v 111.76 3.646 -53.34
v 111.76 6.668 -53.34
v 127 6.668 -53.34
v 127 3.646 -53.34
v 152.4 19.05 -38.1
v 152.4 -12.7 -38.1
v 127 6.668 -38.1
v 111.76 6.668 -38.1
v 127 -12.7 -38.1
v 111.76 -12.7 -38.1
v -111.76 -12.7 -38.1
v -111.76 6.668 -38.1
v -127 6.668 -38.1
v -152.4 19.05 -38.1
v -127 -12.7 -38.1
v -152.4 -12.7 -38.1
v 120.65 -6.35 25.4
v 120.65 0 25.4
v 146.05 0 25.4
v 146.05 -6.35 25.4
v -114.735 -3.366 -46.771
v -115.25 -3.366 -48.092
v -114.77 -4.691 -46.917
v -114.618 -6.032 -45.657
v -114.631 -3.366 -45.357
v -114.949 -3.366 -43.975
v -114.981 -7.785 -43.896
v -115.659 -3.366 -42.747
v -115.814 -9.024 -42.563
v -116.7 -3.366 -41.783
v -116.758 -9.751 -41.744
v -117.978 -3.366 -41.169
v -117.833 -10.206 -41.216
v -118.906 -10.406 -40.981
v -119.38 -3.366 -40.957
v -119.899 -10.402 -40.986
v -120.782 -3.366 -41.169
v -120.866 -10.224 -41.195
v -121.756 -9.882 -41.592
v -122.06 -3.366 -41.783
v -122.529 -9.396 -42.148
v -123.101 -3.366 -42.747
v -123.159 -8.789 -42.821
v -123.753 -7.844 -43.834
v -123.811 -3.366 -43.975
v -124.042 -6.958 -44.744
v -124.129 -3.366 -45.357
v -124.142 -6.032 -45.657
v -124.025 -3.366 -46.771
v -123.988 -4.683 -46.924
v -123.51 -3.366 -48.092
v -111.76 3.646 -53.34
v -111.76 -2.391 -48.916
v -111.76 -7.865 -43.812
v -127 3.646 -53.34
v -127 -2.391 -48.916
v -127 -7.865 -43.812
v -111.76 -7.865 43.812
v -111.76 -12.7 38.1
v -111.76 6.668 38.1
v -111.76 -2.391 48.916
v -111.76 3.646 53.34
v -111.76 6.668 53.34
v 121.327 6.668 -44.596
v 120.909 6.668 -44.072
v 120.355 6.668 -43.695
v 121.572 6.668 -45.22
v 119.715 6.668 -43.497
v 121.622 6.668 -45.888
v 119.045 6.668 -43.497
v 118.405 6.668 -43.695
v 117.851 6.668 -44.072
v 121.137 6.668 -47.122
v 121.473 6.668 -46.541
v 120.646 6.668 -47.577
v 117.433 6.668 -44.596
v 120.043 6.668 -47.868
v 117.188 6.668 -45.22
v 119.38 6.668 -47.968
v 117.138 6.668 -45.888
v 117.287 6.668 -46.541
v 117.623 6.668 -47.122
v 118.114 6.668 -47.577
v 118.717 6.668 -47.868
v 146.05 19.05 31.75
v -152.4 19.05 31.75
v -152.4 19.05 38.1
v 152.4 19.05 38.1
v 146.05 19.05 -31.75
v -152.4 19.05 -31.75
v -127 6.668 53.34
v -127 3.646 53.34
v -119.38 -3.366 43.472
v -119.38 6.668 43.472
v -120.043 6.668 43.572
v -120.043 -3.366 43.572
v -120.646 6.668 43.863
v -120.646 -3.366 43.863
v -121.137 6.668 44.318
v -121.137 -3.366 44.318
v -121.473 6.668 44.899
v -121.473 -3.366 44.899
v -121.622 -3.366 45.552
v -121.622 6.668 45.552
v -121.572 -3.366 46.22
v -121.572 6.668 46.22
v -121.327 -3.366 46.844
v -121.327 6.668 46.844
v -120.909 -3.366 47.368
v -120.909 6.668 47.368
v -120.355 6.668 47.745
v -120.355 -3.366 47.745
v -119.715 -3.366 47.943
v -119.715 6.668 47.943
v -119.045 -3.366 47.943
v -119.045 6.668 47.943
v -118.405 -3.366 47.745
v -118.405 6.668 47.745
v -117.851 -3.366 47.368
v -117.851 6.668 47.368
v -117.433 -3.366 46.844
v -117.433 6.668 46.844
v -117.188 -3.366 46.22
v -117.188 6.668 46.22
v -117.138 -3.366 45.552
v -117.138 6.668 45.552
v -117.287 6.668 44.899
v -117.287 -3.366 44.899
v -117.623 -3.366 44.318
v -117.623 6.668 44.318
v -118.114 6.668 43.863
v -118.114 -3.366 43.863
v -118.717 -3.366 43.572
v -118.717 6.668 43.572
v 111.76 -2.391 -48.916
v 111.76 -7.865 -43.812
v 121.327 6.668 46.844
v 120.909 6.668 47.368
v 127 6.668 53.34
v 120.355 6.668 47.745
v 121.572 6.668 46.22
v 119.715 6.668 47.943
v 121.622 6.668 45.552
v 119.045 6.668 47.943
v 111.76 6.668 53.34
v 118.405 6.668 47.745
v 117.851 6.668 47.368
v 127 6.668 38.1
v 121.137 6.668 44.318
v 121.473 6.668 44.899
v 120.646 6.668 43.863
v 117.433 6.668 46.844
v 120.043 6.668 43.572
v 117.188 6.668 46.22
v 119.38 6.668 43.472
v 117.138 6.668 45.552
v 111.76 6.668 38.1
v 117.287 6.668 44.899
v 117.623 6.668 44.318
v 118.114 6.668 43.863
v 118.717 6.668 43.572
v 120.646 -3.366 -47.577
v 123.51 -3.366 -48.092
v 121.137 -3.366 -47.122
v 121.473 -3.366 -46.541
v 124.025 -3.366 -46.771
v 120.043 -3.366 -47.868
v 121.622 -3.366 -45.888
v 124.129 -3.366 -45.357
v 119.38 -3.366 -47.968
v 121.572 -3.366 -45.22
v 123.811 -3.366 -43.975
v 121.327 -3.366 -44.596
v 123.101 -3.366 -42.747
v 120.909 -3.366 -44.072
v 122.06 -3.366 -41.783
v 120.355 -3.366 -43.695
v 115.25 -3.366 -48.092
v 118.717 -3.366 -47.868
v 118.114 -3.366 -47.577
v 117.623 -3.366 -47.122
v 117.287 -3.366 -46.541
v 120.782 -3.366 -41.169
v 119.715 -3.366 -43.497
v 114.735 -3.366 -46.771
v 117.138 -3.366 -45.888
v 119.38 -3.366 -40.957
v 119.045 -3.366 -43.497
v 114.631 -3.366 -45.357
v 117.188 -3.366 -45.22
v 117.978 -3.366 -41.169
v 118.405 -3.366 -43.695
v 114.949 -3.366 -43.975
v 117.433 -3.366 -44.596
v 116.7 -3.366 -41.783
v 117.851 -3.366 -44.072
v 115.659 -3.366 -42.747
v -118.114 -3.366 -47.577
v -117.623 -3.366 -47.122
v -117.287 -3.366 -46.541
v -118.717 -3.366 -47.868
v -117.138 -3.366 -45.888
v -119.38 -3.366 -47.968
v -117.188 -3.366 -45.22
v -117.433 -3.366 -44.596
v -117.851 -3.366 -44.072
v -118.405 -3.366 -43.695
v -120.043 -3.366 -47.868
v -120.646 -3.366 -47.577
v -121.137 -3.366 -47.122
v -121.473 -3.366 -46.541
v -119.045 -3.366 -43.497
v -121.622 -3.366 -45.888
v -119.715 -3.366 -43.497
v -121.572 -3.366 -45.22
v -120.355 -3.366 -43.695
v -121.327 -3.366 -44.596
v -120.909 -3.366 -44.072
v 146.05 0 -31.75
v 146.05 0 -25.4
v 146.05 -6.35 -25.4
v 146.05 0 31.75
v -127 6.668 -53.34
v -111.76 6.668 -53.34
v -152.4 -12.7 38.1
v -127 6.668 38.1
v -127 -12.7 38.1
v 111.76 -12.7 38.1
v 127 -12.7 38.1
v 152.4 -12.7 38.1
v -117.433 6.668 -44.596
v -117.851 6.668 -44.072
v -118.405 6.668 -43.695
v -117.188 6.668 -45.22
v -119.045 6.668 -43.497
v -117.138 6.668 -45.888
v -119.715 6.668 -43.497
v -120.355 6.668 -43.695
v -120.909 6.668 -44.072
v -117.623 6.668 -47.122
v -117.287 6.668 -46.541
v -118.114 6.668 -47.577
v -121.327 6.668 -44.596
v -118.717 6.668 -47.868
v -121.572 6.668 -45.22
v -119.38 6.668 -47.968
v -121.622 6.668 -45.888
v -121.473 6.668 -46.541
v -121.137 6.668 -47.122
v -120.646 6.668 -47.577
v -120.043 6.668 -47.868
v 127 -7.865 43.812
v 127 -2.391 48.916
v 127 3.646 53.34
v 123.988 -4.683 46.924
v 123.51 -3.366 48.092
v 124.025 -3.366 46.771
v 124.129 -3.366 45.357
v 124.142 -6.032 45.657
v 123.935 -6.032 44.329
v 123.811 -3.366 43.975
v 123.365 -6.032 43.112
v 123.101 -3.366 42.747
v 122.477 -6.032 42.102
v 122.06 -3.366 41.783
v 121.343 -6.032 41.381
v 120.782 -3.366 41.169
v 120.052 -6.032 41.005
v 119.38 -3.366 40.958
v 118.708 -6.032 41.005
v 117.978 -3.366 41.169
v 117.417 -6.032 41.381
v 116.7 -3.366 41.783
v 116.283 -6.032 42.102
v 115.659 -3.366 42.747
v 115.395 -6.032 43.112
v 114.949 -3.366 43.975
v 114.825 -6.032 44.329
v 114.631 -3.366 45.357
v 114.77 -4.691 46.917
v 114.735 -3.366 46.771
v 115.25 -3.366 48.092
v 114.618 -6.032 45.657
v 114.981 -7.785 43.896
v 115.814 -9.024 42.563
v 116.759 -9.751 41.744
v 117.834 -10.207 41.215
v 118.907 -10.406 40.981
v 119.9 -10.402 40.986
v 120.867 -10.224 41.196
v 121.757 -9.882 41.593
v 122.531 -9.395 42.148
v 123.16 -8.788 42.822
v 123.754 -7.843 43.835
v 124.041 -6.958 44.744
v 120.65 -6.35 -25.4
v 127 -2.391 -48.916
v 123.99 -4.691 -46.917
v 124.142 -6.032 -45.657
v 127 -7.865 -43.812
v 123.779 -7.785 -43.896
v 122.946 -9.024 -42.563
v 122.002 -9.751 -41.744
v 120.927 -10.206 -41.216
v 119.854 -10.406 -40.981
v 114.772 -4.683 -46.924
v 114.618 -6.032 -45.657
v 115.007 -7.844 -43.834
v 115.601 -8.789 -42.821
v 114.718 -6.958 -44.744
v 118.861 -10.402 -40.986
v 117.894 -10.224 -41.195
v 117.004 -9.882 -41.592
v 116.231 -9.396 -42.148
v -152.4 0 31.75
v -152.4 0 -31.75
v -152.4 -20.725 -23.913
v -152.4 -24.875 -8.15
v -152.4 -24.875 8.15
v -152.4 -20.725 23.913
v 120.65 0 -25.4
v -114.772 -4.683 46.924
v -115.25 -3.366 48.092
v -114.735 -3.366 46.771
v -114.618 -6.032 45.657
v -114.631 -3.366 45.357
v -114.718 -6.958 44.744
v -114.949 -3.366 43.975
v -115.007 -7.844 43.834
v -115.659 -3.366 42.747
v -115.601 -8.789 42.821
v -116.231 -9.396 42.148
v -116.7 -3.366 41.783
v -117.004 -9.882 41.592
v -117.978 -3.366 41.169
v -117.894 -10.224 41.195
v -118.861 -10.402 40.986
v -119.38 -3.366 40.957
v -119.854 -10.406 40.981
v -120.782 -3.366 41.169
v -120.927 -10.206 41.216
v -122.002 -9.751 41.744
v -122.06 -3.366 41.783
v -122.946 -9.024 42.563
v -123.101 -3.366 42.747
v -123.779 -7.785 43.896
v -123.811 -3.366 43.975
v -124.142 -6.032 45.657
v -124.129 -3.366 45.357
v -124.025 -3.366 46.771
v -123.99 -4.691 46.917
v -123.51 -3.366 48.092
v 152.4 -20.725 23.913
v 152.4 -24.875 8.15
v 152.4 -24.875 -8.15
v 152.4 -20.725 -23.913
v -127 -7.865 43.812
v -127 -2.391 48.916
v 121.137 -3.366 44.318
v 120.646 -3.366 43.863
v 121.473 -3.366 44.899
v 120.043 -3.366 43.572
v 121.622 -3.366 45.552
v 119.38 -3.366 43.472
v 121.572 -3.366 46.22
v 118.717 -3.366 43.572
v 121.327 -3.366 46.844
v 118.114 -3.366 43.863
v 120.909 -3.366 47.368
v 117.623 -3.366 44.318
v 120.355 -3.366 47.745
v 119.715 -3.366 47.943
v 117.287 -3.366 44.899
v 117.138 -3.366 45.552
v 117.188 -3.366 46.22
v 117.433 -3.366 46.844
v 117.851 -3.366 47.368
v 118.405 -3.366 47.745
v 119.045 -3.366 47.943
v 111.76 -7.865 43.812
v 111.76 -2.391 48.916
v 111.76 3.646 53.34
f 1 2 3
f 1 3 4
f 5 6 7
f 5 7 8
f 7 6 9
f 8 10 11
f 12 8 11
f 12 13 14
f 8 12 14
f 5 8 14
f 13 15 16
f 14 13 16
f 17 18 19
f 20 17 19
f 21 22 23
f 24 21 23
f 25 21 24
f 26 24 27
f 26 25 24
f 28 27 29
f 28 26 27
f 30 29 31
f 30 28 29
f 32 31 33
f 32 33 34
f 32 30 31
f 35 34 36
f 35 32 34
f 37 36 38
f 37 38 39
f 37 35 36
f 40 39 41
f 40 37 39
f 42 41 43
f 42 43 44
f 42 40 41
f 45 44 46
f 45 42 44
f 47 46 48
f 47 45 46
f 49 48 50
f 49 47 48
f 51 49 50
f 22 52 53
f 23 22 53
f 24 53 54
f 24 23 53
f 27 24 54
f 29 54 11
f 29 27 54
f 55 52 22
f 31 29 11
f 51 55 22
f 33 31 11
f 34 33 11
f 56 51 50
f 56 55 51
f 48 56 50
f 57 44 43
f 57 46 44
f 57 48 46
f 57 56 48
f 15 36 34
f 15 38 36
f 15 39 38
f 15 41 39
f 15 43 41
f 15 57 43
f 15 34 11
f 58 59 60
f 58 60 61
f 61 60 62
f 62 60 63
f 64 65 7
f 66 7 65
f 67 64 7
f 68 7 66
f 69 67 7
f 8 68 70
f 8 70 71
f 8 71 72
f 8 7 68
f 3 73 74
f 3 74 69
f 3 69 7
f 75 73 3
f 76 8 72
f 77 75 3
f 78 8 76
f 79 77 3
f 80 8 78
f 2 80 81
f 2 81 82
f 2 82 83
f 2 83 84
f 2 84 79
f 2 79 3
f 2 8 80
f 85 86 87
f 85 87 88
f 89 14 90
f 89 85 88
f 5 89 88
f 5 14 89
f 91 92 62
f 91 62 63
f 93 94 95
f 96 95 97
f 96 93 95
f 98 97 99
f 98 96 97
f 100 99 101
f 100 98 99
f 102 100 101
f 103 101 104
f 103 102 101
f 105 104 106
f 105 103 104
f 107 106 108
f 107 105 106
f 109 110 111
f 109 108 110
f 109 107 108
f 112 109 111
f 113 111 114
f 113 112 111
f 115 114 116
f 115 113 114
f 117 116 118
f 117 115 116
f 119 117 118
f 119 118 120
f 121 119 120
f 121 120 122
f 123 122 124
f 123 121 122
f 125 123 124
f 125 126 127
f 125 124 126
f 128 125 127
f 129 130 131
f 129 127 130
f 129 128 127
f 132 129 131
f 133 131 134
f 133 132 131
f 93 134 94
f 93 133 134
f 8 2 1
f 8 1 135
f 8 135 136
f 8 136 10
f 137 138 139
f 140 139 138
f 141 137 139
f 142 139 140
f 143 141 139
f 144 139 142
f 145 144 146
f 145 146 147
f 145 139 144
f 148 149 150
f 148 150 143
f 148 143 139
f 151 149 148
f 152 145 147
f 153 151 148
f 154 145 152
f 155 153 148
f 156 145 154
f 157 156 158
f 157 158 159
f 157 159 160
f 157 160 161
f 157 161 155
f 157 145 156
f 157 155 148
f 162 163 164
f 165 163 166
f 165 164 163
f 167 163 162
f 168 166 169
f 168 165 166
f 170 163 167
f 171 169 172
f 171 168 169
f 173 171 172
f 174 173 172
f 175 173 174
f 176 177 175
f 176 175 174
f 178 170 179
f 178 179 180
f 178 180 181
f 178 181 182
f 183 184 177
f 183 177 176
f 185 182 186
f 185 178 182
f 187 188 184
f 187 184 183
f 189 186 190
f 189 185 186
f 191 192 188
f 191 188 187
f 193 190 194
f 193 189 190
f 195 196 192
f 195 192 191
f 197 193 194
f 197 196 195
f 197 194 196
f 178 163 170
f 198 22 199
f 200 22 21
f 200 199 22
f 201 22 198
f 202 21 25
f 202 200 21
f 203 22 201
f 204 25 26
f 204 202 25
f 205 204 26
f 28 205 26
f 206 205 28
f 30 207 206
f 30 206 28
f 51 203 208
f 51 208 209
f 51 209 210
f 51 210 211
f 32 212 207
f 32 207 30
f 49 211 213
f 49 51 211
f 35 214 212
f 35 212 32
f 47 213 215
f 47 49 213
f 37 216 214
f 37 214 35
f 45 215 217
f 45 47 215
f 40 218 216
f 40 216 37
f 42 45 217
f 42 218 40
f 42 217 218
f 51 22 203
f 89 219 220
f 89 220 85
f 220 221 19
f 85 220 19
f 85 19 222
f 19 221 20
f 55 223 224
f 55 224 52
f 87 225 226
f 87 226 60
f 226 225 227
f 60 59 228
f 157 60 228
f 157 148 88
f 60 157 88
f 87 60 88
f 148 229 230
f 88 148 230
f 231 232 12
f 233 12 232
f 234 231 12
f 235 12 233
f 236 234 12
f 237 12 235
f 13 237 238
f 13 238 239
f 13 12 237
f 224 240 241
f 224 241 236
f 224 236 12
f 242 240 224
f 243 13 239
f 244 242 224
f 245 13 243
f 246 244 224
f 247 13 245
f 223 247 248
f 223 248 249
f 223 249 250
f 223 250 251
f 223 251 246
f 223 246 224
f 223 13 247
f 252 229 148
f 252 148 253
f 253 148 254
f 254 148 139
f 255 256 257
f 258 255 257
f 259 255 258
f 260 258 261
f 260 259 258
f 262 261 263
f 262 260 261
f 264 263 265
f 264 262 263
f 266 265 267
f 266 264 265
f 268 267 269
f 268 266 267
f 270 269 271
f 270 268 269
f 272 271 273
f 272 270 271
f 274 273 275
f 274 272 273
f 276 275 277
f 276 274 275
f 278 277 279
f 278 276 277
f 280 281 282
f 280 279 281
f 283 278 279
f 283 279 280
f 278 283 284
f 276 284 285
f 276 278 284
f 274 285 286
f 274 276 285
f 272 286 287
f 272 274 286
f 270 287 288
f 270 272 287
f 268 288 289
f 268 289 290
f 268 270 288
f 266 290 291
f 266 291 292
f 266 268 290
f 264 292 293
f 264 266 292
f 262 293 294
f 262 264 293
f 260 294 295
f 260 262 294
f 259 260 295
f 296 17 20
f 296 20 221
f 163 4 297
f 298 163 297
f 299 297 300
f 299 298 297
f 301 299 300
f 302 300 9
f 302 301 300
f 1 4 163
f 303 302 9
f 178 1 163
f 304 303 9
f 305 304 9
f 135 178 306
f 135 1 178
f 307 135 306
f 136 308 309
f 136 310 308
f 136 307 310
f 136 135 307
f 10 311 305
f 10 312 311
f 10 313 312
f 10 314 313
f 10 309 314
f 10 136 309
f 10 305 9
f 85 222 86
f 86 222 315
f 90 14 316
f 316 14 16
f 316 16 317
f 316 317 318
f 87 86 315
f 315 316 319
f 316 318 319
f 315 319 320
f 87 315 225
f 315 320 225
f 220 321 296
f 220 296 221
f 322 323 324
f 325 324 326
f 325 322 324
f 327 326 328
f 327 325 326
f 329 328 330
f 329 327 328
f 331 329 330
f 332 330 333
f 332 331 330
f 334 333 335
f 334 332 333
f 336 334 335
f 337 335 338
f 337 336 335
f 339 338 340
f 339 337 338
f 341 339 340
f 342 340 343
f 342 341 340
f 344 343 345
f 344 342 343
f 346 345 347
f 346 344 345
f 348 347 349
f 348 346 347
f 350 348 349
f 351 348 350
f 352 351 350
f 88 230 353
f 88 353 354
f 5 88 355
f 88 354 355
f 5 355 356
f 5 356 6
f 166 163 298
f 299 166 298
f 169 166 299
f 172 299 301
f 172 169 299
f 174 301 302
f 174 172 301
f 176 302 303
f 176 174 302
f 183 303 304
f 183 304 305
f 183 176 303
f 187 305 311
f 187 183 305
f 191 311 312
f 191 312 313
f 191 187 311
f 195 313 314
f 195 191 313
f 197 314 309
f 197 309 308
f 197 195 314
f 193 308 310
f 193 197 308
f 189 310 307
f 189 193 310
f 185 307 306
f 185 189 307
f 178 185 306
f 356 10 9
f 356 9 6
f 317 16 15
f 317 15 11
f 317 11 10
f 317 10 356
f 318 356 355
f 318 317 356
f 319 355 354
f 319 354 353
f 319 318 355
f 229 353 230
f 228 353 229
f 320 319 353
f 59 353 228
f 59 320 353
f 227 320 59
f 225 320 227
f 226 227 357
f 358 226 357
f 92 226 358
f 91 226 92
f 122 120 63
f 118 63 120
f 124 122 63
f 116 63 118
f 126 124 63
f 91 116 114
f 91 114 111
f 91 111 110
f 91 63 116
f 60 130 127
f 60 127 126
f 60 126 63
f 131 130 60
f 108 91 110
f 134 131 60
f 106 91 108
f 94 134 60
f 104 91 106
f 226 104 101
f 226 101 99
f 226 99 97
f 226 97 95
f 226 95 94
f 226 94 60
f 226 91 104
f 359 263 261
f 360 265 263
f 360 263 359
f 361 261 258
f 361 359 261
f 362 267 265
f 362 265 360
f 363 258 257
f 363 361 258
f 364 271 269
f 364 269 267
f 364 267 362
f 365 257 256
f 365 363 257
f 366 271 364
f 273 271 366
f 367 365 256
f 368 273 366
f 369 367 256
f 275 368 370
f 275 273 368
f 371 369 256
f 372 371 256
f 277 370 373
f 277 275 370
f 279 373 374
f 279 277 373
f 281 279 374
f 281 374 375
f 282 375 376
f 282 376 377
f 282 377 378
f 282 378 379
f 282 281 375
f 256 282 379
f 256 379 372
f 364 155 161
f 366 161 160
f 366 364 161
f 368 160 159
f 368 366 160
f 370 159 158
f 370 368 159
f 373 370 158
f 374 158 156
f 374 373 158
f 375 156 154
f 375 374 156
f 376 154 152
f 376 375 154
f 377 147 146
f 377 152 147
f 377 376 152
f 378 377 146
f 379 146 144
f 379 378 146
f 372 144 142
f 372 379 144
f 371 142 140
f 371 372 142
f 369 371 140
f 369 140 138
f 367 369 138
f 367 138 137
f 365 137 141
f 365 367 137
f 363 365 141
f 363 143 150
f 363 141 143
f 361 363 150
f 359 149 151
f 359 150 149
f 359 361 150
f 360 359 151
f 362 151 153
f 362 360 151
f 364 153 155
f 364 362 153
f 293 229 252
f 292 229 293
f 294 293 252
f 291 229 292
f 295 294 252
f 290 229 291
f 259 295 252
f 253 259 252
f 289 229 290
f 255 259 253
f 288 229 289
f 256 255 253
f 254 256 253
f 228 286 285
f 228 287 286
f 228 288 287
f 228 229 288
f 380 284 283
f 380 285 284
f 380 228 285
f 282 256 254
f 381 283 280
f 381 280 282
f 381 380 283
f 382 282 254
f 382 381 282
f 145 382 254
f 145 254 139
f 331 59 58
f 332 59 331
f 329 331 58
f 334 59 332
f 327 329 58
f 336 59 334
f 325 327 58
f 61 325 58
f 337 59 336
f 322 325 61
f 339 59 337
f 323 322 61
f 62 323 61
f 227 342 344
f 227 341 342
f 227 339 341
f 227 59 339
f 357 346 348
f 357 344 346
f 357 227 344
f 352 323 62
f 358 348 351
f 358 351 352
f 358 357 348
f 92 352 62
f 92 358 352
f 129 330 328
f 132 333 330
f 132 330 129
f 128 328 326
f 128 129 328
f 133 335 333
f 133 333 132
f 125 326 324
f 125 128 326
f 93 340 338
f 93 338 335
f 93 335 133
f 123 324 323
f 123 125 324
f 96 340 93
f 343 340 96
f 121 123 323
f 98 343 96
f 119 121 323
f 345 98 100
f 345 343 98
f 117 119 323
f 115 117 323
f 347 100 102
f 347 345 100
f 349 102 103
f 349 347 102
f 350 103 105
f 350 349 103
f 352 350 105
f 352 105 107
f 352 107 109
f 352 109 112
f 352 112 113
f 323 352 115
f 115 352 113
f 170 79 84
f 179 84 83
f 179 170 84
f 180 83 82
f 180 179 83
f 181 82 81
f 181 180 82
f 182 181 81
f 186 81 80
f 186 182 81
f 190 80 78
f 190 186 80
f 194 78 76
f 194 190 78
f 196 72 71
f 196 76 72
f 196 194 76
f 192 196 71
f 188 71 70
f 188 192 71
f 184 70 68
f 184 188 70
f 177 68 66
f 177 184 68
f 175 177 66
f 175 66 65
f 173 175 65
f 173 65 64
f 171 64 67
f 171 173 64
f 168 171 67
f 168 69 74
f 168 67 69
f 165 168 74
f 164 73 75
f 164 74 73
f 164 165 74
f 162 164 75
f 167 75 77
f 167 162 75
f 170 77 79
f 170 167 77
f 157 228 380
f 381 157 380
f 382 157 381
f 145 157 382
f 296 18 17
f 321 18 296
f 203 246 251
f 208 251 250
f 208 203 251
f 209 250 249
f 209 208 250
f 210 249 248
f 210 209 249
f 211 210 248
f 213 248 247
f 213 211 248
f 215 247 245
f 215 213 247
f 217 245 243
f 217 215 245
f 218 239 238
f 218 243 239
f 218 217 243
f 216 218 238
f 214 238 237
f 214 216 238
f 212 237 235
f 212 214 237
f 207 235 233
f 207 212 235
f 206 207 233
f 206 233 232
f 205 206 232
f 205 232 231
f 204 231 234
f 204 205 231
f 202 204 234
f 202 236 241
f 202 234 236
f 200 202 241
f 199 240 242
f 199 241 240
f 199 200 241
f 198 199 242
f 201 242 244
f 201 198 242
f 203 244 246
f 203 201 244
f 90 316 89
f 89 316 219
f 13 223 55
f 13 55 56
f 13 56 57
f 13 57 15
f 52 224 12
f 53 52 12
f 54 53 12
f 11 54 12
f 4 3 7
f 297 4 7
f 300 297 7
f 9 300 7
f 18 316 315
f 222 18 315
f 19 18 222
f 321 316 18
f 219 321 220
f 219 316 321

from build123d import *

# Parameters (mm, degrees)
SKETCH1_W                                   = 304.8
SKETCH1_H                                   = 76.2
BOSS_EXTRUDE1_DEPTH                         = 6.35
SKETCH3_W                                   = 25.4
SKETCH3_H                                   = 50.8
CUT_EXTRUDE2_DEPTH                          = 25.4
BOSS_EXTRUDE2_DEPTH                         = 19.05
BOSS_EXTRUDE3_DEPTH                         = 304.8
BOSS_EXTRUDE4_DEPTH                         = 15.24
BOSS_EXTRUDE5_DEPTH                         = 15.24
CBORE_FOR_8_BINDING_HEAD_MACHINE_SC_2_COUNT = 2
CBORE_FOR_8_BINDING_HEAD_MACHINE_SC_2_PITCH = 238.76
CBORE_FOR_8_BINDING_HEAD_MACHINE_SC_3_COUNT = 2
CBORE_FOR_8_BINDING_HEAD_MACHINE_SC_3_PITCH = 255.670904094
CBORE_FOR_8_BINDING_HEAD_MACHINE_SC_4_COUNT = 2
CBORE_FOR_8_BINDING_HEAD_MACHINE_SC_4_PITCH = 91.44
SKETCH12_R                                  = 2.2479
CUT_EXTRUDE3_DEPTH                          = 23.0345001


with BuildPart() as part:
    # Sketch1 → Boss-Extrude1 (new body)
    with BuildSketch(Plane(origin=(0, 0, 0), x_dir=(1, 0, 0), z_dir=(0, 1, 0))):
        Rectangle(SKETCH1_W, SKETCH1_H)
    extrude(amount=-BOSS_EXTRUDE1_DEPTH)

    # Sketch3 → Cut-Extrude2 (cut)
    with BuildSketch(Plane(origin=(0, 0, 0), x_dir=(1, 0, 0), z_dir=(0, 1, 0))):
        with Locations((133.35, 0)):
            Rectangle(SKETCH3_W, SKETCH3_H)
    extrude(amount=-CUT_EXTRUDE2_DEPTH, mode=Mode.SUBTRACT)

    # Sketch4 → Boss-Extrude2 (add)
    with BuildSketch(Plane(origin=(0, 0, 0), x_dir=(1, 0, 0), z_dir=(0, 1, 0))):
        Polygon((152.4, 38.1), (-152.4, 38.1), (-152.4, 31.75), (146.05, 31.75), (152.4, 31.75), align=None)
        Polygon((146.05, -31.75), (-152.4, -31.75), (-152.4, -38.1), (152.4, -38.1), (152.4, -31.75), align=None)
        Polygon((152.4, -31.75), (152.4, 31.75), (146.05, 31.75), (146.05, 25.4), (146.05, -25.4), (146.05, -31.75), align=None)
    extrude(amount=BOSS_EXTRUDE2_DEPTH)

    # Sketch5 → Boss-Extrude3 (add)
    with BuildSketch(Plane.ZY.offset(152.4)):
        with BuildLine():
            Line((38.1, -6.35), (-38.1, -6.35))
            Line((-38.1, -6.35), (-38.1, -12.7))
            ThreePointArc((-38.1, -12.7), (0, -25.4), (38.1, -12.7))
            Line((38.1, -12.7), (38.1, -6.35))
        make_face()
    extrude(amount=-BOSS_EXTRUDE3_DEPTH)

    # Sketch8 → Boss-Extrude4 (add)
    with BuildSketch(Plane.ZY.offset(127)):
        with BuildLine():
            Line((-38.1, -12.7), (-38.1, 6.6675))
            Line((-38.1, 6.6675), (-53.34, 6.6675))
            Line((-53.34, 6.6675), (-53.34, 3.645763686))
            ThreePointArc((-53.34, 3.645763686), (-46.444745641, -5.202835962), (-38.1, -12.7))
        make_face()
        with BuildLine():
            Line((53.34, 3.645763686), (53.34, 6.6675))
            Line((53.34, 6.6675), (38.1, 6.6675))
            Line((38.1, 6.6675), (38.1, -12.7))
            ThreePointArc((38.1, -12.7), (46.444745641, -5.202835962), (53.34, 3.645763686))
        make_face()
    extrude(amount=-BOSS_EXTRUDE4_DEPTH)

    # Sketch9 → Boss-Extrude5 (add)
    with BuildSketch(Plane.ZY.offset(-111.76)):
        with BuildLine():
            Line((-38.1, -12.7), (-38.1, 6.6675))
            Line((-38.1, 6.6675), (-53.34, 6.6675))
            Line((-53.34, 6.6675), (-53.34, 3.645763686))
            ThreePointArc((-53.34, 3.645763686), (-46.444745641, -5.202835962), (-38.1, -12.7))
        make_face()
        with BuildLine():
            Line((53.34, 3.645763686), (53.34, 6.6675))
            Line((53.34, 6.6675), (38.1, 6.6675))
            Line((38.1, 6.6675), (38.1, -12.7))
            ThreePointArc((38.1, -12.7), (46.444745641, -5.202835962), (53.34, 3.645763686))
        make_face()
    extrude(amount=-BOSS_EXTRUDE5_DEPTH)

    # Sketch11 → CBORE for #8 Binding Head Machine Screw1 (revolve, cut)
    with BuildSketch(Plane(origin=(-119.38, -6.0325, -45.72), x_dir=(0, 0, -1), z_dir=(1, 0, 0))):
        Polygon((0, 0), (0, 25.0825), (2.2479, 25.0825), (2.2479, 2.667), (4.7625, 2.667), (4.7625, 0), align=None)
    cbore_for_8_binding_head_machine_screw1 = revolve(axis=Axis((-119.38, -12.3825, -45.72), (0, 1, 0)), mode=Mode.SUBTRACT)

    # CBORE for _8 Binding Head Machine Sc 2: CBORE for #8 Binding Head Machine Screw1 ×2
    with Locations(*[(i * CBORE_FOR_8_BINDING_HEAD_MACHINE_SC_2_PITCH, 0, 0) for i in range(1, CBORE_FOR_8_BINDING_HEAD_MACHINE_SC_2_COUNT)]):
        add(cbore_for_8_binding_head_machine_screw1, mode=Mode.SUBTRACT)

    # CBORE for _8 Binding Head Machine Sc 3: CBORE for #8 Binding Head Machine Screw1 ×2
    with Locations(*[Vector(0.933856752, 0, 0.357647267) * (i * CBORE_FOR_8_BINDING_HEAD_MACHINE_SC_3_PITCH) for i in range(1, CBORE_FOR_8_BINDING_HEAD_MACHINE_SC_3_COUNT)]):
        add(cbore_for_8_binding_head_machine_screw1, mode=Mode.SUBTRACT)

    # CBORE for _8 Binding Head Machine Sc 4: CBORE for #8 Binding Head Machine Screw1 ×2
    with Locations(*[(0, 0, i * CBORE_FOR_8_BINDING_HEAD_MACHINE_SC_4_PITCH) for i in range(1, CBORE_FOR_8_BINDING_HEAD_MACHINE_SC_4_COUNT)]):
        add(cbore_for_8_binding_head_machine_screw1, mode=Mode.SUBTRACT)

    # Sketch12 → Cut-Extrude3 (cut, through all)
    with BuildSketch(Plane.XZ.offset(3.3655)):
        with BuildLine():
            Line((-123.509642203, -48.092227124), (-115.250357797, -48.092227124))
            ThreePointArc((-115.250357797, -48.092227124), (-119.38, -40.9575), (-123.509642203, -48.092227124))
        make_face()
        with BuildLine():
            ThreePointArc((-114.6175, -45.72), (-120.607596281, -41.118433569), (-123.509642203, -48.092227124))
            Line((-123.509642203, -48.092227124), (-115.250357797, -48.092227124))
            ThreePointArc((-115.250357797, -48.092227124), (-114.778433569, -46.947596281), (-114.6175, -45.72))
        make_face()
        with BuildLine():
            Line((-115.250357797, -48.092227124), (-123.509642203, -48.092227124))
            ThreePointArc((-123.509642203, -48.092227124), (-119.38, -50.4825), (-115.250357797, -48.092227124))
        make_face()
        with BuildLine():
            Line((-123.509642203, 48.092227124), (-115.250357797, 48.092227124))
            ThreePointArc((-115.250357797, 48.092227124), (-119.38, 50.4825), (-123.509642203, 48.092227124))
        make_face()
        with BuildLine():
            ThreePointArc((-123.509642203, 48.092227124), (-119.38, 40.9575), (-115.250357797, 48.092227124))
            Line((-115.250357797, 48.092227124), (-123.509642203, 48.092227124))
        make_face()
        with Locations((-119.38, 45.72)):
            Circle(SKETCH12_R, mode=Mode.SUBTRACT)
        with BuildLine():
            ThreePointArc((124.1425, 45.72), (123.981566431, 46.947596281), (123.509642203, 48.092227124))
            Line((123.509642203, 48.092227124), (115.250357797, 48.092227124))
            ThreePointArc((115.250357797, 48.092227124), (118.152403719, 41.118433569), (124.1425, 45.72))
        make_face()
        with BuildLine():
            Line((115.250357797, 48.092227124), (123.509642203, 48.092227124))
            ThreePointArc((123.509642203, 48.092227124), (119.38, 50.4825), (115.250357797, 48.092227124))
        make_face()
        with BuildLine():
            Line((123.509642203, 48.092227124), (115.250357797, 48.092227124))
            ThreePointArc((115.250357797, 48.092227124), (119.38, 40.9575), (123.509642203, 48.092227124))
        make_face()
        with BuildLine():
            Line((115.250357797, -48.092227124), (123.509642203, -48.092227124))
            ThreePointArc((123.509642203, -48.092227124), (119.38, -40.9575), (115.250357797, -48.092227124))
        make_face()
        with BuildLine():
            ThreePointArc((124.1425, -45.72), (118.152403719, -41.118433569), (115.250357797, -48.092227124))
            Line((115.250357797, -48.092227124), (123.509642203, -48.092227124))
            ThreePointArc((123.509642203, -48.092227124), (123.981566431, -46.947596281), (124.1425, -45.72))
        make_face()
        with BuildLine():
            Line((123.509642203, -48.092227124), (115.250357797, -48.092227124))
            ThreePointArc((115.250357797, -48.092227124), (119.38, -50.4825), (123.509642203, -48.092227124))
        make_face()
        with Locations((-119.38, 45.72)):
            Circle(SKETCH12_R)
    extrude(amount=CUT_EXTRUDE3_DEPTH, mode=Mode.SUBTRACT)


solid = part.part
